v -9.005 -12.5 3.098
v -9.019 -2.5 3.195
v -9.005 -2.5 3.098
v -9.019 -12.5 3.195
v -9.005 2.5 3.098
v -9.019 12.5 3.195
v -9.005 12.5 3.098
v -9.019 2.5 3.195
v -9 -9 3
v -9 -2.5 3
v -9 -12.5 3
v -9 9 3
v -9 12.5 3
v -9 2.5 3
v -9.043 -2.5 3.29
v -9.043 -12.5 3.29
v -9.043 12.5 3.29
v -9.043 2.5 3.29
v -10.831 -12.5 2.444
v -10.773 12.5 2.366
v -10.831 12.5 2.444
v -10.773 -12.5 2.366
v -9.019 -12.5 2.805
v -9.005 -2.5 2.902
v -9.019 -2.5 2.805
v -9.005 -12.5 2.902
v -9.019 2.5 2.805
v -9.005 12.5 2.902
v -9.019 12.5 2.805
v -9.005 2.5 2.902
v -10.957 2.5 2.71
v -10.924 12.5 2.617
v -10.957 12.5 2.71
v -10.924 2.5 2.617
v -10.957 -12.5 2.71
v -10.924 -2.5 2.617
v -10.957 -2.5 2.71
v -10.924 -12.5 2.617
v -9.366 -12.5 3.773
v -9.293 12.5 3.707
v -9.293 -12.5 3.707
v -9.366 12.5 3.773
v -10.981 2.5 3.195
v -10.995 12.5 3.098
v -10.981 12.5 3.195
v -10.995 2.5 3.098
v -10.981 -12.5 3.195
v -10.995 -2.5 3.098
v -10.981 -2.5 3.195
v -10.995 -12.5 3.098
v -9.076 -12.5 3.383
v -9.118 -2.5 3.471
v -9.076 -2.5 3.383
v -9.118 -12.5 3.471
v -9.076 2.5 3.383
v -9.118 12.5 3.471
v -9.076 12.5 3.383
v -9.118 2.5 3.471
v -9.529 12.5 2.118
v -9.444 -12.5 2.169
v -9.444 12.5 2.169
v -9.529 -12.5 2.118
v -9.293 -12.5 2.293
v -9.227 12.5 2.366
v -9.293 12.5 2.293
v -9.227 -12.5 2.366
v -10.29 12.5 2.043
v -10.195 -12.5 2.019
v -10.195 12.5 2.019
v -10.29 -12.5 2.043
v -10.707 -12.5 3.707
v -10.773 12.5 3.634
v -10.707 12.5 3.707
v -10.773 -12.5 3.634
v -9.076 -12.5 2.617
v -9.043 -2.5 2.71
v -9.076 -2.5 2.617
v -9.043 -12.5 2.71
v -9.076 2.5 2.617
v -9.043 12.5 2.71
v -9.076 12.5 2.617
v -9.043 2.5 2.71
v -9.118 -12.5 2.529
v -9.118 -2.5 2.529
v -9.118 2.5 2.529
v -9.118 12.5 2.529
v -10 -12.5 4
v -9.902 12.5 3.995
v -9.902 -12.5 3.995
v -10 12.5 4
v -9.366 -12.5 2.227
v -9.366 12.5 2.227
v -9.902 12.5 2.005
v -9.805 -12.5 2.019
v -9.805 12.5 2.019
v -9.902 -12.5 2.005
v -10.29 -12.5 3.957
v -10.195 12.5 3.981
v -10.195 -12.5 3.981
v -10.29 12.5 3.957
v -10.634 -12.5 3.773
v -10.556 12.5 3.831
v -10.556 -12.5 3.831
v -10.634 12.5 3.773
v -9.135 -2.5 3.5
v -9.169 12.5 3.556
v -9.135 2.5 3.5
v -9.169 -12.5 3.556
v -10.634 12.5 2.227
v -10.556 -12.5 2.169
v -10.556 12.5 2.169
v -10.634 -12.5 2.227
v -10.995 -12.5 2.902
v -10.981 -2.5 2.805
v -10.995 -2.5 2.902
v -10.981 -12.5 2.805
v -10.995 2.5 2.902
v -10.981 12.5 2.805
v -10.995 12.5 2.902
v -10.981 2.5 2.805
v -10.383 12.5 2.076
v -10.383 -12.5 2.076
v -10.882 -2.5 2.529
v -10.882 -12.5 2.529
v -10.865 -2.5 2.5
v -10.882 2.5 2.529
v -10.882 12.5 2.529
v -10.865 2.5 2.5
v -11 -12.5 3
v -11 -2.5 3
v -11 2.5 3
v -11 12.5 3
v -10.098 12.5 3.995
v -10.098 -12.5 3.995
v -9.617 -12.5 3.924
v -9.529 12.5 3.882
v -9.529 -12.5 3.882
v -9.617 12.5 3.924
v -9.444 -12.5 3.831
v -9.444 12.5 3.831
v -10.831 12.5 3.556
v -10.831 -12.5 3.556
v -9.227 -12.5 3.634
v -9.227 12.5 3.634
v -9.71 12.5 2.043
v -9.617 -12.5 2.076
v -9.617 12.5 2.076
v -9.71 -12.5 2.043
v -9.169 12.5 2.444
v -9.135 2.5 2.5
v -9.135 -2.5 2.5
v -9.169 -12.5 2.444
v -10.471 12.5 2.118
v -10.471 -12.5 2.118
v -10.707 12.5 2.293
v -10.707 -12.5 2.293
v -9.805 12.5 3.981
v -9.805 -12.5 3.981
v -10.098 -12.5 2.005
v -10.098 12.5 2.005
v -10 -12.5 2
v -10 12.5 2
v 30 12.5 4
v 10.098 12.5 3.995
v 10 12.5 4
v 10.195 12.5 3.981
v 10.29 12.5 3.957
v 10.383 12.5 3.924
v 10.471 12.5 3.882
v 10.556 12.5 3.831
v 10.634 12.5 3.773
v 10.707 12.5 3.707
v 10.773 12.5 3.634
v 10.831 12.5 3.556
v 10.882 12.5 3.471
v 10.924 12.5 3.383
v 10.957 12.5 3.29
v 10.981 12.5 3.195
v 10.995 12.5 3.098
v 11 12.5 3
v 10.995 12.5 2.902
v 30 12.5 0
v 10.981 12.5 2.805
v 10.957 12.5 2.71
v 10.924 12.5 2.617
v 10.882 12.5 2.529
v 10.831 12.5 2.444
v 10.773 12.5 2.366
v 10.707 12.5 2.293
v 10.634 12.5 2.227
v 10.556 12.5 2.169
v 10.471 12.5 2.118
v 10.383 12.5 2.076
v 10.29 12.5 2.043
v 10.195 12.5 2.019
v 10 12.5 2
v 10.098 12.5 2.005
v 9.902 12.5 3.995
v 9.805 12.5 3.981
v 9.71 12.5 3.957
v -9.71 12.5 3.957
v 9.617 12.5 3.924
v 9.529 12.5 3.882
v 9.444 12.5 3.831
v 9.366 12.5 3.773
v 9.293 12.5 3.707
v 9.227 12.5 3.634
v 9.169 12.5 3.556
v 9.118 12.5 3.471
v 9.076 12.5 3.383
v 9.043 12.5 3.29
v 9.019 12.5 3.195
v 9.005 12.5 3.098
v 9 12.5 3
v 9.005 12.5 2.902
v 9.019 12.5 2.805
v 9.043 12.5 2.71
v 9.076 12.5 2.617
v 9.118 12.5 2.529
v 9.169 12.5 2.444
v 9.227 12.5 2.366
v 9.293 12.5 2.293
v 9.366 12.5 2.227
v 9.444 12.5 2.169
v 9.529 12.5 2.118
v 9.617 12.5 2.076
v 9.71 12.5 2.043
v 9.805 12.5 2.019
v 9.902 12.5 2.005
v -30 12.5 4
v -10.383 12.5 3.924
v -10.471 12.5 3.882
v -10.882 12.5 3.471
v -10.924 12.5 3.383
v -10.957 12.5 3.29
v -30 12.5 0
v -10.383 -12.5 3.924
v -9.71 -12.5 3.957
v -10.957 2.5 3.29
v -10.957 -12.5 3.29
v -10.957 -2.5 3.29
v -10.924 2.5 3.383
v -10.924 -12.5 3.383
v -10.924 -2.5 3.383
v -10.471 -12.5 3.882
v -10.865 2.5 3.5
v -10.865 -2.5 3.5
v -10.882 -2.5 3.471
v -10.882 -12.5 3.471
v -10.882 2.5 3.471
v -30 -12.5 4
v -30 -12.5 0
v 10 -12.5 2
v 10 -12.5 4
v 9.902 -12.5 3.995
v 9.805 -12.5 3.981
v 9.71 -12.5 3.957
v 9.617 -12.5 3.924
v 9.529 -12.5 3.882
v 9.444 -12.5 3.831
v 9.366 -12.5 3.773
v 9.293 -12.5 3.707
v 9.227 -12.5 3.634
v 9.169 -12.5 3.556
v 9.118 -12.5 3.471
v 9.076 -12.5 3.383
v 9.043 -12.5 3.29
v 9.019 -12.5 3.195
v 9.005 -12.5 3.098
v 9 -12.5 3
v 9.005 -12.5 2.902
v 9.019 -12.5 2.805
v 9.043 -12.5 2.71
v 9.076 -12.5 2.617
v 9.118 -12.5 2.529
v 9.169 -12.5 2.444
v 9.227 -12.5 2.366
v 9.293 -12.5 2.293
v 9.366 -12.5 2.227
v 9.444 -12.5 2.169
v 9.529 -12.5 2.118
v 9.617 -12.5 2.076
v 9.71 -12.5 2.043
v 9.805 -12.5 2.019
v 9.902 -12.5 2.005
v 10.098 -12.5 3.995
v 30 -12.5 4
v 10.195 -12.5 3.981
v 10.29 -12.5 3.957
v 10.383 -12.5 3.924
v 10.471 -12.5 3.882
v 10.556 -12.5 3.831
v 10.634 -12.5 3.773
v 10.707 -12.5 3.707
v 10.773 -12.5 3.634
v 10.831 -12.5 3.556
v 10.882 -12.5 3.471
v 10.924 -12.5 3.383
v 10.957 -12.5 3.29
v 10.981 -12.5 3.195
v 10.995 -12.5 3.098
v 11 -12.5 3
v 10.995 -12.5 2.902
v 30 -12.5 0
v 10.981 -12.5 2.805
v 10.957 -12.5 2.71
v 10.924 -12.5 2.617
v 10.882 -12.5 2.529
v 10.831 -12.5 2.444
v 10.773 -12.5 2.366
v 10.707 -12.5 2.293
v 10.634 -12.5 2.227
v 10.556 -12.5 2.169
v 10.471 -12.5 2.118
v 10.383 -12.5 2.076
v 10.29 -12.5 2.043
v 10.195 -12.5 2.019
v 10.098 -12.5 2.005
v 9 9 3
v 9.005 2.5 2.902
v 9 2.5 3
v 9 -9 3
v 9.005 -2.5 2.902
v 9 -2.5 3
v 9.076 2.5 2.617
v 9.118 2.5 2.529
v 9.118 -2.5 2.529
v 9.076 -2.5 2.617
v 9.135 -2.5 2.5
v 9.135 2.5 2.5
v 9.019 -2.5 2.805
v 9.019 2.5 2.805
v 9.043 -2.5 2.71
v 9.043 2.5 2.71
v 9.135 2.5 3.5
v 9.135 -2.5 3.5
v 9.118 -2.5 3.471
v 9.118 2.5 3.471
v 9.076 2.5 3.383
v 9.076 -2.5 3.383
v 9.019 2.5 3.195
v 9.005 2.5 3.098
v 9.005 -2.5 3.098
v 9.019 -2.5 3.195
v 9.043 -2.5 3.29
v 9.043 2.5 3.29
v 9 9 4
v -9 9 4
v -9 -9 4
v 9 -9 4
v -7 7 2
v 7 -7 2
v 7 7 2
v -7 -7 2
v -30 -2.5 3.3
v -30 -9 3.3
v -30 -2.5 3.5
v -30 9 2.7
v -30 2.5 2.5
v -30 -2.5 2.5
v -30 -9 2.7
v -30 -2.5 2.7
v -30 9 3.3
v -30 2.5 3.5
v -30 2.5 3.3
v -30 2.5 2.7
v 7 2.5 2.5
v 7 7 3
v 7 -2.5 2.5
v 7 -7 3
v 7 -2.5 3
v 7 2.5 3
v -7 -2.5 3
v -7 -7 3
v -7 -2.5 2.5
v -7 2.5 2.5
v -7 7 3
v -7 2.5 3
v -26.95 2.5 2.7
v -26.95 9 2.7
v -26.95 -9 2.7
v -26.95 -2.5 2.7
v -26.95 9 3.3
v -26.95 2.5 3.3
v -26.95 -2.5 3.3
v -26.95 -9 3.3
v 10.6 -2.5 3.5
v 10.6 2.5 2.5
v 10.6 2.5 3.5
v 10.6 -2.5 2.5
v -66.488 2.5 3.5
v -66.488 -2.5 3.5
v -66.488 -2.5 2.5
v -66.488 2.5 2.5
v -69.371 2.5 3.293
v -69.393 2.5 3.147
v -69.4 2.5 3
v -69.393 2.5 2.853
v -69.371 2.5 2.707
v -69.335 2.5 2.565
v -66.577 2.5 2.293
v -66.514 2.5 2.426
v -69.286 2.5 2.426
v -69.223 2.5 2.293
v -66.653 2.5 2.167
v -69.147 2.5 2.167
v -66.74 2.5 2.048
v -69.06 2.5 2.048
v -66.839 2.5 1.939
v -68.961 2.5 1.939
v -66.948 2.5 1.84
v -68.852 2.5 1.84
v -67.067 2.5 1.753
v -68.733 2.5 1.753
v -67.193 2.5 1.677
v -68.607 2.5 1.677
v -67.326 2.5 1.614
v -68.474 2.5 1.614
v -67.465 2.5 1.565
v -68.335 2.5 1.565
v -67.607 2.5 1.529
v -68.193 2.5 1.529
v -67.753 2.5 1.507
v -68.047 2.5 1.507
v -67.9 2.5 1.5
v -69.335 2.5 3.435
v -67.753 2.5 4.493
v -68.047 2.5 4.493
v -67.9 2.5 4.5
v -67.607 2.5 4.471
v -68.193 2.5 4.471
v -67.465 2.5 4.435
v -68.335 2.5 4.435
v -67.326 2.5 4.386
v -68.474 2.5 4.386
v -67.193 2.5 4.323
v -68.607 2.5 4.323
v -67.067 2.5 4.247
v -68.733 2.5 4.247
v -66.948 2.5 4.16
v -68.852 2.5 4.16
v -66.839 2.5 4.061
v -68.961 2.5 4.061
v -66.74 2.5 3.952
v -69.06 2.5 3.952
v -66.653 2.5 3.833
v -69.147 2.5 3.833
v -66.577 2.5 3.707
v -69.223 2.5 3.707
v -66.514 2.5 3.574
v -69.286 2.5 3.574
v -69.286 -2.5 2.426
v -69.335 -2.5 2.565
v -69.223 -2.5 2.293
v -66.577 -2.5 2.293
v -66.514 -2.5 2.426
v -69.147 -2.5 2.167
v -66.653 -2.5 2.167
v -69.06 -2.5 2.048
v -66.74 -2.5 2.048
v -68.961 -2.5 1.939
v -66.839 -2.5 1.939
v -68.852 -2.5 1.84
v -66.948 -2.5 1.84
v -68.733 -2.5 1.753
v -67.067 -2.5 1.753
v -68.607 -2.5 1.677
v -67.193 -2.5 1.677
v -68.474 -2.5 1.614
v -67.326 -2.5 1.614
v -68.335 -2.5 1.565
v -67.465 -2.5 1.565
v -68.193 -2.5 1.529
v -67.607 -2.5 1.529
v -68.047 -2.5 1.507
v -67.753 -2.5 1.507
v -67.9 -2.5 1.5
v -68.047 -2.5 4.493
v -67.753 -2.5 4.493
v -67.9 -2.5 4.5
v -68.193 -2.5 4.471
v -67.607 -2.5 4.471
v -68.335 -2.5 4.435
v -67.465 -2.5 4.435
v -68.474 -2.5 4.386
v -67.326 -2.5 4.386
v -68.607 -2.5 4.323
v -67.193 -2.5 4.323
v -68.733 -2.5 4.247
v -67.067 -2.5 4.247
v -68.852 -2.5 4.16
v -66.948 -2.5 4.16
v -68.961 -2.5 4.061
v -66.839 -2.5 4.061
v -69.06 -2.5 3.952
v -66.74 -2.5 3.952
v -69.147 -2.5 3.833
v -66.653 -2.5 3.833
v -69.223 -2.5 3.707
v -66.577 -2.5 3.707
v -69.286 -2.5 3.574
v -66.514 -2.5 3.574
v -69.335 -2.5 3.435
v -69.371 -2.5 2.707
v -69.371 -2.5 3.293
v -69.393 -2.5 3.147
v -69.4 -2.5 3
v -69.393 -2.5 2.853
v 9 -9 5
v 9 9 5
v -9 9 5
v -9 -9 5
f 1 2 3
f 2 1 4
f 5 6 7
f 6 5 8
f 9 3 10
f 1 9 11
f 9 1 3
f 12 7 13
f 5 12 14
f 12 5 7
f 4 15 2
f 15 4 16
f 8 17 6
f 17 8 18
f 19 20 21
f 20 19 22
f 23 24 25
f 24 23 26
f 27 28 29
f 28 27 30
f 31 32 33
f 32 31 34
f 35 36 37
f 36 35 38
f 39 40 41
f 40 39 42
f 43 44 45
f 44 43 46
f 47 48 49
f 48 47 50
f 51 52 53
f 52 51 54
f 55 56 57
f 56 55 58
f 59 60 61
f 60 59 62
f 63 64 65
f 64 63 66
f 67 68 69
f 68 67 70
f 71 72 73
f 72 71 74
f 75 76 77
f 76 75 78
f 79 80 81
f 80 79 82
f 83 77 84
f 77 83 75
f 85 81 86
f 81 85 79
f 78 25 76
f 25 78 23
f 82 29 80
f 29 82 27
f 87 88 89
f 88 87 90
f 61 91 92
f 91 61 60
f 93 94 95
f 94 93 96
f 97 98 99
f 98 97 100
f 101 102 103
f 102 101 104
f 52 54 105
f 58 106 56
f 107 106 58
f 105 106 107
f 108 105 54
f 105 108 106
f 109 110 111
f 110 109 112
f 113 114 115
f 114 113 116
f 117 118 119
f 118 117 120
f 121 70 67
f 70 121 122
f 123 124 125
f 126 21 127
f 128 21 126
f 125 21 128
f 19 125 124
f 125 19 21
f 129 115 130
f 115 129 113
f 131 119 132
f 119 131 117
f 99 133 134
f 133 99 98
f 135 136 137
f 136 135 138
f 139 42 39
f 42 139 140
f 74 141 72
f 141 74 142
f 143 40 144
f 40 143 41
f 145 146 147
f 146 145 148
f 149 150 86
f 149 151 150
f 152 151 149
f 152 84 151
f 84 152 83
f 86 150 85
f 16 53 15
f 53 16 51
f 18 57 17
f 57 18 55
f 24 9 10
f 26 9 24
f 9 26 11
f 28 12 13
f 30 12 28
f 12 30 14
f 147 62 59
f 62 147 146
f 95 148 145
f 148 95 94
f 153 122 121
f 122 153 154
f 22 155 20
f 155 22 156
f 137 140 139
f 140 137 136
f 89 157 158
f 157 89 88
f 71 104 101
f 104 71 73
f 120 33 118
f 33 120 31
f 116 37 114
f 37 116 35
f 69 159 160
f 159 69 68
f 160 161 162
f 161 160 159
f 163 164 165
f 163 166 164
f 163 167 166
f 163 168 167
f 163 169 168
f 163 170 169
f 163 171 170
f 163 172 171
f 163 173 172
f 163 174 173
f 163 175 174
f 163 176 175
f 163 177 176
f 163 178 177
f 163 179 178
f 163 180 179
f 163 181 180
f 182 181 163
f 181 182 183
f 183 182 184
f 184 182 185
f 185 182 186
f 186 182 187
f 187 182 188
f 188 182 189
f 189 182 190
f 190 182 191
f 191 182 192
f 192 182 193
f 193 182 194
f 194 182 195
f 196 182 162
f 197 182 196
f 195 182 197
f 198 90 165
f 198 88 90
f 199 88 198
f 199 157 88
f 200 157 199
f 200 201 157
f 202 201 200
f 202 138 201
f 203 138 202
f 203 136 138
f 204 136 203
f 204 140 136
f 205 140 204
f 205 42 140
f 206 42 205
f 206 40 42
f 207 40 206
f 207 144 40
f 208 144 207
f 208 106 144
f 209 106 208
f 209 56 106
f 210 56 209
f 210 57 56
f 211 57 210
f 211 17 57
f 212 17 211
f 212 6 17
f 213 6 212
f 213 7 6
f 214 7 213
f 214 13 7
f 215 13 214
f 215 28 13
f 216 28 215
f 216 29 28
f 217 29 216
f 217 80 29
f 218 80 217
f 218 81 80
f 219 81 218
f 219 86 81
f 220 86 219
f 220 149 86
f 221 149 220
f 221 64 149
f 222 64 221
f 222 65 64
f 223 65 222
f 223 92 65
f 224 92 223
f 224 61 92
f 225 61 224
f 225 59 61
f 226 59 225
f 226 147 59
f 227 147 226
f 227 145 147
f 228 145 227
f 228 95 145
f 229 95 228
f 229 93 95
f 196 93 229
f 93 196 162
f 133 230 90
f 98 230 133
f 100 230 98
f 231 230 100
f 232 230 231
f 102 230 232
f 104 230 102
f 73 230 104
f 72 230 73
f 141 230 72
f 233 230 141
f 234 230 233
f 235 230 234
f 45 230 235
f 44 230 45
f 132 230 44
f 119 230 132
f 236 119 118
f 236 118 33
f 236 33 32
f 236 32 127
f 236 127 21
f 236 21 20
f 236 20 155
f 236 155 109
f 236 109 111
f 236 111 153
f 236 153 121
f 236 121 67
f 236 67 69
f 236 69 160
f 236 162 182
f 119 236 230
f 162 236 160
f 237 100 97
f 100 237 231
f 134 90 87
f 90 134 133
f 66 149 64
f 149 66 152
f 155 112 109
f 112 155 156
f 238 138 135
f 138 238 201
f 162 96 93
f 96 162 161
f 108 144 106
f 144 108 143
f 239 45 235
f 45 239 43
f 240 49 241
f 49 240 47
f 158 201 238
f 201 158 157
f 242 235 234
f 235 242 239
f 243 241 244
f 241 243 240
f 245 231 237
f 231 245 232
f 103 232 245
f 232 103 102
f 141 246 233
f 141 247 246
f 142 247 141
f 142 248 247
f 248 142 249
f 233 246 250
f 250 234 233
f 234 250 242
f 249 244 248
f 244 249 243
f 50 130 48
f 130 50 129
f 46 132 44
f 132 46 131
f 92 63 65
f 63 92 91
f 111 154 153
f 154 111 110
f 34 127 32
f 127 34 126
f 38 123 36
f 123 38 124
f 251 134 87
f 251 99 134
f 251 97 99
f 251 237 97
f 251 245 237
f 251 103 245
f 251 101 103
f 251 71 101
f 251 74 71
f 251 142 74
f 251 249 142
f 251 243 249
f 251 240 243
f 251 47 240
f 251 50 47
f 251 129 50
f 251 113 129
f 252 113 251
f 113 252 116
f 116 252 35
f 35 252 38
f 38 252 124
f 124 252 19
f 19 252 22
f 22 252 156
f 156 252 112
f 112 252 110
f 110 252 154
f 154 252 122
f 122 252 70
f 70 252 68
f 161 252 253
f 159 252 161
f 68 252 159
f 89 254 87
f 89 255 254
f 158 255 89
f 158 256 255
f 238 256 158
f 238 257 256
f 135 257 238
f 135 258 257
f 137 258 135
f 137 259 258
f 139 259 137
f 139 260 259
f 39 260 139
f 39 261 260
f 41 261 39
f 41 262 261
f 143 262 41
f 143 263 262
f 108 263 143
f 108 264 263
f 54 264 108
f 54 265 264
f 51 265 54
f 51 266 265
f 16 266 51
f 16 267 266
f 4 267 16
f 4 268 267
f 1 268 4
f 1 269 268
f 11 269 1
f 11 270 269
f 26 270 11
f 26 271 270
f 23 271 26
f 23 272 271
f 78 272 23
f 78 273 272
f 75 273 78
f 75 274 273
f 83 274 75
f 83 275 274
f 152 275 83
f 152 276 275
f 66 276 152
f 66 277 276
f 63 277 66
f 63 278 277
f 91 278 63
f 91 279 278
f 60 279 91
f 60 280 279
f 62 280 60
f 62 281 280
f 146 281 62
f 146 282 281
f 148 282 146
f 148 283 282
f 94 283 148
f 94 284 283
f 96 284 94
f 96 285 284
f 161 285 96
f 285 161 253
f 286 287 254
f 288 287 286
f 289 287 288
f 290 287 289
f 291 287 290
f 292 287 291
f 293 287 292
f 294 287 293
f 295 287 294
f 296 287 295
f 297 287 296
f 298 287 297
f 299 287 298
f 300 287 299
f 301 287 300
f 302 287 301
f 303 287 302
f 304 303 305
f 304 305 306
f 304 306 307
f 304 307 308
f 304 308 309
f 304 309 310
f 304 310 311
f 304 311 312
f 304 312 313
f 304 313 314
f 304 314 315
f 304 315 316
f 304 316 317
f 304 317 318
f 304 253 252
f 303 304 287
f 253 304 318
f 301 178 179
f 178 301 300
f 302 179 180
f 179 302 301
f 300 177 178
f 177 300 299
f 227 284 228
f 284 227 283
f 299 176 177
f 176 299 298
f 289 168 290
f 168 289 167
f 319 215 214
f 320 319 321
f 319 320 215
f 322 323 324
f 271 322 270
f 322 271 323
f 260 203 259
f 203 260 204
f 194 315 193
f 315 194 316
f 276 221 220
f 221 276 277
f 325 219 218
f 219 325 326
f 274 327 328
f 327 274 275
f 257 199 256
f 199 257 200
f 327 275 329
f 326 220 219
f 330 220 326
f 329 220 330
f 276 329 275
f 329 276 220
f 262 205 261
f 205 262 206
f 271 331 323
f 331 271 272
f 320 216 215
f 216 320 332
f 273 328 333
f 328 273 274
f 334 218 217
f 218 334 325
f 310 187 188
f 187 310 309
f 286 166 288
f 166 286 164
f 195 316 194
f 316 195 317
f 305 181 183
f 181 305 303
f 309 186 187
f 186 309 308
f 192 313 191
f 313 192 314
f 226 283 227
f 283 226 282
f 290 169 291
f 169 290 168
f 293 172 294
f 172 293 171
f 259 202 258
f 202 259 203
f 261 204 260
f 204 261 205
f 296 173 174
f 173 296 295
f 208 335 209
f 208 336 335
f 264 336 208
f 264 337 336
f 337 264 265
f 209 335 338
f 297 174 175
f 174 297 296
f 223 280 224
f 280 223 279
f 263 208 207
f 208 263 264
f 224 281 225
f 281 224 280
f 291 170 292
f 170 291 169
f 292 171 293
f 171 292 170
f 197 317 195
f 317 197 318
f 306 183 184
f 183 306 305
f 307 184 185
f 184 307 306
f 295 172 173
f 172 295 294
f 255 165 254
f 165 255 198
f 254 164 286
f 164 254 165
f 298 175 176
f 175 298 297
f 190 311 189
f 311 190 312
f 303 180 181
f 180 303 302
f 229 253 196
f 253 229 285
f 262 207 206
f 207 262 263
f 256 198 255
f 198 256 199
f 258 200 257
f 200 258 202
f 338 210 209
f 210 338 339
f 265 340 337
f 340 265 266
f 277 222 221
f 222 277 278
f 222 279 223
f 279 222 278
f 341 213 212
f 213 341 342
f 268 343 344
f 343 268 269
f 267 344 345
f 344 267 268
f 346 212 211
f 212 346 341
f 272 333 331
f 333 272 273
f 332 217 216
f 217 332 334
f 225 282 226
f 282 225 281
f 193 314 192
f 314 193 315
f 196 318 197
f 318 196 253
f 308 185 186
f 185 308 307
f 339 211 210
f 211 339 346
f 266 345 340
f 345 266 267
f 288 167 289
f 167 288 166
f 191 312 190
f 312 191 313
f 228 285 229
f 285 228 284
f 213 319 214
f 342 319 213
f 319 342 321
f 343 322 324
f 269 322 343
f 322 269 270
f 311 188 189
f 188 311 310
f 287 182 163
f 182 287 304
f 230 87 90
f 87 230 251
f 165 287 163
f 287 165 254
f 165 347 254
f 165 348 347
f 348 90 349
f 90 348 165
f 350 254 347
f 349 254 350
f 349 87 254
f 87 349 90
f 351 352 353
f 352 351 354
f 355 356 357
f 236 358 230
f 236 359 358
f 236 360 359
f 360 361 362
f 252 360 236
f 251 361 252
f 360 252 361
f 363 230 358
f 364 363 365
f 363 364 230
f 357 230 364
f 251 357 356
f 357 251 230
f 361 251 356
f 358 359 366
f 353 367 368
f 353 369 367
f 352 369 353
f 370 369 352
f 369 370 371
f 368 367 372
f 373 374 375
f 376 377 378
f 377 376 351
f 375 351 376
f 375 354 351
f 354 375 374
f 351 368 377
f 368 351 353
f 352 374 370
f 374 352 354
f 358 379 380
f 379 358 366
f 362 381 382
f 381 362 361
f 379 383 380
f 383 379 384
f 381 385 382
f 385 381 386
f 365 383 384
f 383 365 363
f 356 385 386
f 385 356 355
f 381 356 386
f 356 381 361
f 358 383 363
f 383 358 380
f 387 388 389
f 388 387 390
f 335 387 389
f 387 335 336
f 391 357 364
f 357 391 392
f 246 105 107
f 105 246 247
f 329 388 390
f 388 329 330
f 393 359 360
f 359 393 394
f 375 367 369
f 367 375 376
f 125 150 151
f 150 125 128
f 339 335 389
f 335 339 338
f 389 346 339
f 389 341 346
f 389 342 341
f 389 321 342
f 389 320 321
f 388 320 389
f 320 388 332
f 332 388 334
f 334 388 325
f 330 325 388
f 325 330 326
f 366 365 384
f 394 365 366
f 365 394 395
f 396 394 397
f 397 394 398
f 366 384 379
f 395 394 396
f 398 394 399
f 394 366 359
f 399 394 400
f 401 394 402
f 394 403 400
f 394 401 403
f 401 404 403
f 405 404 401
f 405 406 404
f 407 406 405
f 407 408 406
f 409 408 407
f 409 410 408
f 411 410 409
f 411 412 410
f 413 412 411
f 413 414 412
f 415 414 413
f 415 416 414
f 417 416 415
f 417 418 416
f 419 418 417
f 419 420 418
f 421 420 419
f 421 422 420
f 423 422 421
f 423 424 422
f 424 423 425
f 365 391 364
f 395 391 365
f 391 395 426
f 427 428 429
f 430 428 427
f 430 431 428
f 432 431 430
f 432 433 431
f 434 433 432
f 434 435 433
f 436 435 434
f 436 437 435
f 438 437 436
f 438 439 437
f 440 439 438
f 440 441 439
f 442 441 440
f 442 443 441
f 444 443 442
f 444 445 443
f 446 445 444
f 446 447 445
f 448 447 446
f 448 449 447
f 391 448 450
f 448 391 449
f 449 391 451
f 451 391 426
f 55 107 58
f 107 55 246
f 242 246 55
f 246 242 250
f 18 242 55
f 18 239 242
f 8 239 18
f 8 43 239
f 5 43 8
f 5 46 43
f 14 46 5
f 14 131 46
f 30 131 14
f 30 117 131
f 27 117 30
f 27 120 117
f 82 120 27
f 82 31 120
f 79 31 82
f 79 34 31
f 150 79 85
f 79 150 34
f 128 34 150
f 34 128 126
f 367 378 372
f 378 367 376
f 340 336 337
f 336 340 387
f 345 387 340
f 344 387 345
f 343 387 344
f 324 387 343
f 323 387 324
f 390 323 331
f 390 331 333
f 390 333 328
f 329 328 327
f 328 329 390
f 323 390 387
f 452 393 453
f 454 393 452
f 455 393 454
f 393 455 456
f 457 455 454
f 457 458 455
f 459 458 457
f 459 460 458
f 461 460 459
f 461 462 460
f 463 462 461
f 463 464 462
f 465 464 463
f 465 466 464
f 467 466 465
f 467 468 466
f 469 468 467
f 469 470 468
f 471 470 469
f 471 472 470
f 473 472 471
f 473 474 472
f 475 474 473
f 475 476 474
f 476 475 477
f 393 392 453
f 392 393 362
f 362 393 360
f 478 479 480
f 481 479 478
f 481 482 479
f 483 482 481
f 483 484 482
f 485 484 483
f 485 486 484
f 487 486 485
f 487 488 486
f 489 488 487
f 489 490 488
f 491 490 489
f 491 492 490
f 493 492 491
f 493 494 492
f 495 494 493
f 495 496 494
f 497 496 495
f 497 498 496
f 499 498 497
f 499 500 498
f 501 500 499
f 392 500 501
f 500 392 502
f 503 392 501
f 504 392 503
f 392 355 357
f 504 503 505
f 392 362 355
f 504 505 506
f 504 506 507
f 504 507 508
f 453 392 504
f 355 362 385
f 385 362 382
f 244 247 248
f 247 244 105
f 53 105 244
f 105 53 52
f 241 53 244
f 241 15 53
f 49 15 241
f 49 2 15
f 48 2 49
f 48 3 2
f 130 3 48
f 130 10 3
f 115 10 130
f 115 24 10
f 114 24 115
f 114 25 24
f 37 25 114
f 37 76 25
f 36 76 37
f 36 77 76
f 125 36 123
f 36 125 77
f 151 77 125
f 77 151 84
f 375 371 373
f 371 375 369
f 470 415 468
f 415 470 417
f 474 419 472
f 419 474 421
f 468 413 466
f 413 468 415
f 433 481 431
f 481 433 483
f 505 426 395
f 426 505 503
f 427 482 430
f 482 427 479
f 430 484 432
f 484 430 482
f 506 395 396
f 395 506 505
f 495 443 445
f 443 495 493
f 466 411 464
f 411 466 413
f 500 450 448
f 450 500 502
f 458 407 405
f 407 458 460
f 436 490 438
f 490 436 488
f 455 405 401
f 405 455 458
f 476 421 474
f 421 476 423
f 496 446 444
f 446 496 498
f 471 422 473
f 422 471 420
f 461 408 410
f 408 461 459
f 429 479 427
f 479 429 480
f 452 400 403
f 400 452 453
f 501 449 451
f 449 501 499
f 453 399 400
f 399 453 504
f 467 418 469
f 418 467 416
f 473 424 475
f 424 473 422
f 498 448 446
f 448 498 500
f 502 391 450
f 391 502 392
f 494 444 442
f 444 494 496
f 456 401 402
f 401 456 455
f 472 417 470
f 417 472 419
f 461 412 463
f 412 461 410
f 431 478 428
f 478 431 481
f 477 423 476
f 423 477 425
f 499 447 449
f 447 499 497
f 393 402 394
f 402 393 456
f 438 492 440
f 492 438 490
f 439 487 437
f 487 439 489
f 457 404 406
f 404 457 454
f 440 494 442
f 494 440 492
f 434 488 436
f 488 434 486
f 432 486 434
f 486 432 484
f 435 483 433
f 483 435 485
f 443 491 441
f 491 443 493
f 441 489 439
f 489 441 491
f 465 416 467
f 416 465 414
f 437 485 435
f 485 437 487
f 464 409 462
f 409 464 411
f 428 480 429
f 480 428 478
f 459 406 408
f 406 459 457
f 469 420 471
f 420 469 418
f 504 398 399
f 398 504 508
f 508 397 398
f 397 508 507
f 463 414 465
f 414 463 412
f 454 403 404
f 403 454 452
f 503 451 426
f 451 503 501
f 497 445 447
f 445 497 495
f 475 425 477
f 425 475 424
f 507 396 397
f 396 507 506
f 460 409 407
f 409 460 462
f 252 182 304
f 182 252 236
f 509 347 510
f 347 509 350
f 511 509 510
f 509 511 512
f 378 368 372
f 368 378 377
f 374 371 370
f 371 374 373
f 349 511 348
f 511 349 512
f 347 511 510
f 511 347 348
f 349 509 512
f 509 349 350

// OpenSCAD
//////////////////////////////////////////////////////////////
// Option C (C1) — Thick Presentation View (Single FOV)
// Units: mm | F5 Preview, F6 Render
//////////////////////////////////////////////////////////////

//======================== VIEW MODE ========================//
show_mode = "pre";      // "pre"  (לפני משיכה) או "post" (אחרי משיכה)

// הצגה עבה (true) או ריאלית-אופטית (false)
presenter_mode = true;

//======================== BASE PARAMS (PHYSICAL) ===========//
// Glass sizes
glass_bot_size   = [60, 25];     // bottom slide/platform
glass_top_size   = [18, 18];     // top coverslip

// Physical (real) thicknesses
t_glass_real     = 2;            // לצורך הצגה (הוגדל)
frame_thk_real   = 2;            // לצורך הצגה (הוגדל)
zip_thk_real     = 1;            // פער לפני מגע (הוגדל להצגה)
bead_diam_real   = 1;            // חרוזים — הוגדל להצגה

// Window & ports
win_size         = [14, 14];
wall_min         = 5;
port_diam        = 2.0;
port_offset_x    = 10;

//======================== ZIPPER (parametric) ==============//
zip_w            = 5;            // רוחב ה-zipper (מ"מ)
zip_L            = 80;           // **אורך ה-zipper** (מ"מ) — עכשיו ארוך יותר
zip_round        = 1.5;          // קצה מוביל מעוגל

//======================== VISUAL THICKENING =================//
t_glass_vis      = 2;
frame_thk_vis    = 2;
zip_thk_vis      = 1;
bead_diam_vis    = 0.25;

//======================== COLOR & CAMERA ====================//
col_bot_glass    = [0.6,0.8,1.0,0.18];
col_top_glass    = [0.6,0.8,1.0,0.35];
col_frame        = [0.08,0.08,0.08,0.95];
col_zipper       = [1.0,0.6,0.2,0.95];
col_bead         = [0.4,0.4,0.4,0.9];

$vpt = [0,0,10];
$vpr = [63,0,35];
$vpd = 120;
$fn  = 64;

//======================== DERIVED ==========================//
frame_size   = [60, 25];
valid_wx     = (frame_size[0] - win_size[0]) >= 2*wall_min;
valid_wy     = (frame_size[1] - win_size[1]) >= 2*wall_min;

// איזה עובי להשתמש בהצגה
t_glass      = presenter_mode ? t_glass_vis   : t_glass_real;
frame_thk    = presenter_mode ? frame_thk_vis : frame_thk_real;
zip_thk_draw = presenter_mode ? zip_thk_vis   : zip_thk_real;
bead_diam    = presenter_mode ? bead_diam_vis : bead_diam_real;

// Z references (פערים לפי "פיזי" כדי לשמר היגיון)
z_bot     = 0;
z_frame   = z_bot + t_glass;
z_preTop  = z_frame + max(zip_thk_real, 0.01);   // gap before pull
z_postTop = z_frame + max(bead_diam_real, 0);    // after pull (beads) או 0

//======================== MODULES ==========================//
module glass_xy(sizeXY, t, col) {
  color(col)
  translate([-sizeXY[0]/2, -sizeXY[1]/2, 0])
    cube([sizeXY[0], sizeXY[1], t], center=false);
}

module frame_adhesive() {
  outer = [frame_size[0], frame_size[1]];
  inner = [win_size[0],   win_size[1]];
  if (valid_wx && valid_wy) {
    difference() {
      color(col_frame)
      translate([-outer[0]/2, -outer[1]/2, 0])
        cube([outer[0], outer[1], frame_thk], center=false);

      // חלון פנימי
      translate([-inner[0]/2, -inner[1]/2, -0.05])
        cube([inner[0], inner[1], frame_thk+0.1], center=false);

      // חריץ צד ל-zipper — מותאם לרוחב ה-zipper
      slit_len = inner[1] + 4;
      translate([ -outer[0]/2 + 0.3, 0, frame_thk/2 ])
        rotate([0,90,0])
          cube([0.6, slit_len, zip_w + 0.5], center=true);

      // פורטים
      for (sx=[-1,1]) {
        translate([sx*port_offset_x, 0, frame_thk/2])
          rotate([90,0,0])
            cylinder(h=outer[1], r=port_diam/2, center=true);
      }
    }
  } else {
    color(col_frame)
    translate([-outer[0]/2, -outer[1]/2, 0])
      cube([outer[0], outer[1], frame_thk], center=false);
  }
}

module zipper_strip() {
  // Kapton/PSA strip — אורך ורוחב פרמטריים
  lead = zip_round;
  body = zip_L - lead;
  color(col_zipper)
  union() {
    translate([-zip_L/2 + lead, -zip_w/2, 0])
      cube([body, zip_w, zip_thk_draw], center=false);
    translate([-zip_L/2 + lead, 0, zip_thk_draw/2])
      rotate([90,0,0])
        cylinder(h=zip_w, r=lead, center=true);
  }
}

module beads_triangle(zlvl=0) {
  pts = [
    [ 9, 0],
    [ -9*cos(60),  9*sin(60)],
    [ -9*cos(60), -9*sin(60)]
  ];
  for (i=[0:2]) {
    translate([pts[i][0], pts[i][1], zlvl])
      color(col_bead)
        sphere(r = bead_diam/2);
  }
}

//======================== SCENES ===========================//
// Pre-contact (zipper in, gap = zip_thk_real)
module scene_pre() {
  translate([0,0,z_bot])   glass_xy(glass_bot_size, t_glass, col_bot_glass);
  translate([0,0,z_frame]) frame_adhesive();
  // zipper בין הזכוכיות — ארוך יותר, יוצא שמאלה יפה
  translate([-(frame_size[0]/2 - 0.6), 0, z_frame + max(zip_thk_real, 0.01)/2])
    zipper_strip();
  translate([0,0,z_preTop]) glass_xy(glass_top_size, t_glass, col_top_glass);
}

// Post-pull (zipper out; top rests on beads or contact)
module scene_post() {
  translate([0,0,z_bot])   glass_xy(glass_bot_size, t_glass, col_bot_glass);
  translate([0,0,z_frame]) frame_adhesive();
  translate([0,0,z_bot + t_glass + 0.01]) beads_triangle();
  translate([0,0,z_postTop]) glass_xy(glass_top_size, t_glass, col_top_glass);
}

//======================== MAIN =============================//
if (show_mode == "pre") {
  scene_pre();
} else { // "post"
  scene_post();
}
